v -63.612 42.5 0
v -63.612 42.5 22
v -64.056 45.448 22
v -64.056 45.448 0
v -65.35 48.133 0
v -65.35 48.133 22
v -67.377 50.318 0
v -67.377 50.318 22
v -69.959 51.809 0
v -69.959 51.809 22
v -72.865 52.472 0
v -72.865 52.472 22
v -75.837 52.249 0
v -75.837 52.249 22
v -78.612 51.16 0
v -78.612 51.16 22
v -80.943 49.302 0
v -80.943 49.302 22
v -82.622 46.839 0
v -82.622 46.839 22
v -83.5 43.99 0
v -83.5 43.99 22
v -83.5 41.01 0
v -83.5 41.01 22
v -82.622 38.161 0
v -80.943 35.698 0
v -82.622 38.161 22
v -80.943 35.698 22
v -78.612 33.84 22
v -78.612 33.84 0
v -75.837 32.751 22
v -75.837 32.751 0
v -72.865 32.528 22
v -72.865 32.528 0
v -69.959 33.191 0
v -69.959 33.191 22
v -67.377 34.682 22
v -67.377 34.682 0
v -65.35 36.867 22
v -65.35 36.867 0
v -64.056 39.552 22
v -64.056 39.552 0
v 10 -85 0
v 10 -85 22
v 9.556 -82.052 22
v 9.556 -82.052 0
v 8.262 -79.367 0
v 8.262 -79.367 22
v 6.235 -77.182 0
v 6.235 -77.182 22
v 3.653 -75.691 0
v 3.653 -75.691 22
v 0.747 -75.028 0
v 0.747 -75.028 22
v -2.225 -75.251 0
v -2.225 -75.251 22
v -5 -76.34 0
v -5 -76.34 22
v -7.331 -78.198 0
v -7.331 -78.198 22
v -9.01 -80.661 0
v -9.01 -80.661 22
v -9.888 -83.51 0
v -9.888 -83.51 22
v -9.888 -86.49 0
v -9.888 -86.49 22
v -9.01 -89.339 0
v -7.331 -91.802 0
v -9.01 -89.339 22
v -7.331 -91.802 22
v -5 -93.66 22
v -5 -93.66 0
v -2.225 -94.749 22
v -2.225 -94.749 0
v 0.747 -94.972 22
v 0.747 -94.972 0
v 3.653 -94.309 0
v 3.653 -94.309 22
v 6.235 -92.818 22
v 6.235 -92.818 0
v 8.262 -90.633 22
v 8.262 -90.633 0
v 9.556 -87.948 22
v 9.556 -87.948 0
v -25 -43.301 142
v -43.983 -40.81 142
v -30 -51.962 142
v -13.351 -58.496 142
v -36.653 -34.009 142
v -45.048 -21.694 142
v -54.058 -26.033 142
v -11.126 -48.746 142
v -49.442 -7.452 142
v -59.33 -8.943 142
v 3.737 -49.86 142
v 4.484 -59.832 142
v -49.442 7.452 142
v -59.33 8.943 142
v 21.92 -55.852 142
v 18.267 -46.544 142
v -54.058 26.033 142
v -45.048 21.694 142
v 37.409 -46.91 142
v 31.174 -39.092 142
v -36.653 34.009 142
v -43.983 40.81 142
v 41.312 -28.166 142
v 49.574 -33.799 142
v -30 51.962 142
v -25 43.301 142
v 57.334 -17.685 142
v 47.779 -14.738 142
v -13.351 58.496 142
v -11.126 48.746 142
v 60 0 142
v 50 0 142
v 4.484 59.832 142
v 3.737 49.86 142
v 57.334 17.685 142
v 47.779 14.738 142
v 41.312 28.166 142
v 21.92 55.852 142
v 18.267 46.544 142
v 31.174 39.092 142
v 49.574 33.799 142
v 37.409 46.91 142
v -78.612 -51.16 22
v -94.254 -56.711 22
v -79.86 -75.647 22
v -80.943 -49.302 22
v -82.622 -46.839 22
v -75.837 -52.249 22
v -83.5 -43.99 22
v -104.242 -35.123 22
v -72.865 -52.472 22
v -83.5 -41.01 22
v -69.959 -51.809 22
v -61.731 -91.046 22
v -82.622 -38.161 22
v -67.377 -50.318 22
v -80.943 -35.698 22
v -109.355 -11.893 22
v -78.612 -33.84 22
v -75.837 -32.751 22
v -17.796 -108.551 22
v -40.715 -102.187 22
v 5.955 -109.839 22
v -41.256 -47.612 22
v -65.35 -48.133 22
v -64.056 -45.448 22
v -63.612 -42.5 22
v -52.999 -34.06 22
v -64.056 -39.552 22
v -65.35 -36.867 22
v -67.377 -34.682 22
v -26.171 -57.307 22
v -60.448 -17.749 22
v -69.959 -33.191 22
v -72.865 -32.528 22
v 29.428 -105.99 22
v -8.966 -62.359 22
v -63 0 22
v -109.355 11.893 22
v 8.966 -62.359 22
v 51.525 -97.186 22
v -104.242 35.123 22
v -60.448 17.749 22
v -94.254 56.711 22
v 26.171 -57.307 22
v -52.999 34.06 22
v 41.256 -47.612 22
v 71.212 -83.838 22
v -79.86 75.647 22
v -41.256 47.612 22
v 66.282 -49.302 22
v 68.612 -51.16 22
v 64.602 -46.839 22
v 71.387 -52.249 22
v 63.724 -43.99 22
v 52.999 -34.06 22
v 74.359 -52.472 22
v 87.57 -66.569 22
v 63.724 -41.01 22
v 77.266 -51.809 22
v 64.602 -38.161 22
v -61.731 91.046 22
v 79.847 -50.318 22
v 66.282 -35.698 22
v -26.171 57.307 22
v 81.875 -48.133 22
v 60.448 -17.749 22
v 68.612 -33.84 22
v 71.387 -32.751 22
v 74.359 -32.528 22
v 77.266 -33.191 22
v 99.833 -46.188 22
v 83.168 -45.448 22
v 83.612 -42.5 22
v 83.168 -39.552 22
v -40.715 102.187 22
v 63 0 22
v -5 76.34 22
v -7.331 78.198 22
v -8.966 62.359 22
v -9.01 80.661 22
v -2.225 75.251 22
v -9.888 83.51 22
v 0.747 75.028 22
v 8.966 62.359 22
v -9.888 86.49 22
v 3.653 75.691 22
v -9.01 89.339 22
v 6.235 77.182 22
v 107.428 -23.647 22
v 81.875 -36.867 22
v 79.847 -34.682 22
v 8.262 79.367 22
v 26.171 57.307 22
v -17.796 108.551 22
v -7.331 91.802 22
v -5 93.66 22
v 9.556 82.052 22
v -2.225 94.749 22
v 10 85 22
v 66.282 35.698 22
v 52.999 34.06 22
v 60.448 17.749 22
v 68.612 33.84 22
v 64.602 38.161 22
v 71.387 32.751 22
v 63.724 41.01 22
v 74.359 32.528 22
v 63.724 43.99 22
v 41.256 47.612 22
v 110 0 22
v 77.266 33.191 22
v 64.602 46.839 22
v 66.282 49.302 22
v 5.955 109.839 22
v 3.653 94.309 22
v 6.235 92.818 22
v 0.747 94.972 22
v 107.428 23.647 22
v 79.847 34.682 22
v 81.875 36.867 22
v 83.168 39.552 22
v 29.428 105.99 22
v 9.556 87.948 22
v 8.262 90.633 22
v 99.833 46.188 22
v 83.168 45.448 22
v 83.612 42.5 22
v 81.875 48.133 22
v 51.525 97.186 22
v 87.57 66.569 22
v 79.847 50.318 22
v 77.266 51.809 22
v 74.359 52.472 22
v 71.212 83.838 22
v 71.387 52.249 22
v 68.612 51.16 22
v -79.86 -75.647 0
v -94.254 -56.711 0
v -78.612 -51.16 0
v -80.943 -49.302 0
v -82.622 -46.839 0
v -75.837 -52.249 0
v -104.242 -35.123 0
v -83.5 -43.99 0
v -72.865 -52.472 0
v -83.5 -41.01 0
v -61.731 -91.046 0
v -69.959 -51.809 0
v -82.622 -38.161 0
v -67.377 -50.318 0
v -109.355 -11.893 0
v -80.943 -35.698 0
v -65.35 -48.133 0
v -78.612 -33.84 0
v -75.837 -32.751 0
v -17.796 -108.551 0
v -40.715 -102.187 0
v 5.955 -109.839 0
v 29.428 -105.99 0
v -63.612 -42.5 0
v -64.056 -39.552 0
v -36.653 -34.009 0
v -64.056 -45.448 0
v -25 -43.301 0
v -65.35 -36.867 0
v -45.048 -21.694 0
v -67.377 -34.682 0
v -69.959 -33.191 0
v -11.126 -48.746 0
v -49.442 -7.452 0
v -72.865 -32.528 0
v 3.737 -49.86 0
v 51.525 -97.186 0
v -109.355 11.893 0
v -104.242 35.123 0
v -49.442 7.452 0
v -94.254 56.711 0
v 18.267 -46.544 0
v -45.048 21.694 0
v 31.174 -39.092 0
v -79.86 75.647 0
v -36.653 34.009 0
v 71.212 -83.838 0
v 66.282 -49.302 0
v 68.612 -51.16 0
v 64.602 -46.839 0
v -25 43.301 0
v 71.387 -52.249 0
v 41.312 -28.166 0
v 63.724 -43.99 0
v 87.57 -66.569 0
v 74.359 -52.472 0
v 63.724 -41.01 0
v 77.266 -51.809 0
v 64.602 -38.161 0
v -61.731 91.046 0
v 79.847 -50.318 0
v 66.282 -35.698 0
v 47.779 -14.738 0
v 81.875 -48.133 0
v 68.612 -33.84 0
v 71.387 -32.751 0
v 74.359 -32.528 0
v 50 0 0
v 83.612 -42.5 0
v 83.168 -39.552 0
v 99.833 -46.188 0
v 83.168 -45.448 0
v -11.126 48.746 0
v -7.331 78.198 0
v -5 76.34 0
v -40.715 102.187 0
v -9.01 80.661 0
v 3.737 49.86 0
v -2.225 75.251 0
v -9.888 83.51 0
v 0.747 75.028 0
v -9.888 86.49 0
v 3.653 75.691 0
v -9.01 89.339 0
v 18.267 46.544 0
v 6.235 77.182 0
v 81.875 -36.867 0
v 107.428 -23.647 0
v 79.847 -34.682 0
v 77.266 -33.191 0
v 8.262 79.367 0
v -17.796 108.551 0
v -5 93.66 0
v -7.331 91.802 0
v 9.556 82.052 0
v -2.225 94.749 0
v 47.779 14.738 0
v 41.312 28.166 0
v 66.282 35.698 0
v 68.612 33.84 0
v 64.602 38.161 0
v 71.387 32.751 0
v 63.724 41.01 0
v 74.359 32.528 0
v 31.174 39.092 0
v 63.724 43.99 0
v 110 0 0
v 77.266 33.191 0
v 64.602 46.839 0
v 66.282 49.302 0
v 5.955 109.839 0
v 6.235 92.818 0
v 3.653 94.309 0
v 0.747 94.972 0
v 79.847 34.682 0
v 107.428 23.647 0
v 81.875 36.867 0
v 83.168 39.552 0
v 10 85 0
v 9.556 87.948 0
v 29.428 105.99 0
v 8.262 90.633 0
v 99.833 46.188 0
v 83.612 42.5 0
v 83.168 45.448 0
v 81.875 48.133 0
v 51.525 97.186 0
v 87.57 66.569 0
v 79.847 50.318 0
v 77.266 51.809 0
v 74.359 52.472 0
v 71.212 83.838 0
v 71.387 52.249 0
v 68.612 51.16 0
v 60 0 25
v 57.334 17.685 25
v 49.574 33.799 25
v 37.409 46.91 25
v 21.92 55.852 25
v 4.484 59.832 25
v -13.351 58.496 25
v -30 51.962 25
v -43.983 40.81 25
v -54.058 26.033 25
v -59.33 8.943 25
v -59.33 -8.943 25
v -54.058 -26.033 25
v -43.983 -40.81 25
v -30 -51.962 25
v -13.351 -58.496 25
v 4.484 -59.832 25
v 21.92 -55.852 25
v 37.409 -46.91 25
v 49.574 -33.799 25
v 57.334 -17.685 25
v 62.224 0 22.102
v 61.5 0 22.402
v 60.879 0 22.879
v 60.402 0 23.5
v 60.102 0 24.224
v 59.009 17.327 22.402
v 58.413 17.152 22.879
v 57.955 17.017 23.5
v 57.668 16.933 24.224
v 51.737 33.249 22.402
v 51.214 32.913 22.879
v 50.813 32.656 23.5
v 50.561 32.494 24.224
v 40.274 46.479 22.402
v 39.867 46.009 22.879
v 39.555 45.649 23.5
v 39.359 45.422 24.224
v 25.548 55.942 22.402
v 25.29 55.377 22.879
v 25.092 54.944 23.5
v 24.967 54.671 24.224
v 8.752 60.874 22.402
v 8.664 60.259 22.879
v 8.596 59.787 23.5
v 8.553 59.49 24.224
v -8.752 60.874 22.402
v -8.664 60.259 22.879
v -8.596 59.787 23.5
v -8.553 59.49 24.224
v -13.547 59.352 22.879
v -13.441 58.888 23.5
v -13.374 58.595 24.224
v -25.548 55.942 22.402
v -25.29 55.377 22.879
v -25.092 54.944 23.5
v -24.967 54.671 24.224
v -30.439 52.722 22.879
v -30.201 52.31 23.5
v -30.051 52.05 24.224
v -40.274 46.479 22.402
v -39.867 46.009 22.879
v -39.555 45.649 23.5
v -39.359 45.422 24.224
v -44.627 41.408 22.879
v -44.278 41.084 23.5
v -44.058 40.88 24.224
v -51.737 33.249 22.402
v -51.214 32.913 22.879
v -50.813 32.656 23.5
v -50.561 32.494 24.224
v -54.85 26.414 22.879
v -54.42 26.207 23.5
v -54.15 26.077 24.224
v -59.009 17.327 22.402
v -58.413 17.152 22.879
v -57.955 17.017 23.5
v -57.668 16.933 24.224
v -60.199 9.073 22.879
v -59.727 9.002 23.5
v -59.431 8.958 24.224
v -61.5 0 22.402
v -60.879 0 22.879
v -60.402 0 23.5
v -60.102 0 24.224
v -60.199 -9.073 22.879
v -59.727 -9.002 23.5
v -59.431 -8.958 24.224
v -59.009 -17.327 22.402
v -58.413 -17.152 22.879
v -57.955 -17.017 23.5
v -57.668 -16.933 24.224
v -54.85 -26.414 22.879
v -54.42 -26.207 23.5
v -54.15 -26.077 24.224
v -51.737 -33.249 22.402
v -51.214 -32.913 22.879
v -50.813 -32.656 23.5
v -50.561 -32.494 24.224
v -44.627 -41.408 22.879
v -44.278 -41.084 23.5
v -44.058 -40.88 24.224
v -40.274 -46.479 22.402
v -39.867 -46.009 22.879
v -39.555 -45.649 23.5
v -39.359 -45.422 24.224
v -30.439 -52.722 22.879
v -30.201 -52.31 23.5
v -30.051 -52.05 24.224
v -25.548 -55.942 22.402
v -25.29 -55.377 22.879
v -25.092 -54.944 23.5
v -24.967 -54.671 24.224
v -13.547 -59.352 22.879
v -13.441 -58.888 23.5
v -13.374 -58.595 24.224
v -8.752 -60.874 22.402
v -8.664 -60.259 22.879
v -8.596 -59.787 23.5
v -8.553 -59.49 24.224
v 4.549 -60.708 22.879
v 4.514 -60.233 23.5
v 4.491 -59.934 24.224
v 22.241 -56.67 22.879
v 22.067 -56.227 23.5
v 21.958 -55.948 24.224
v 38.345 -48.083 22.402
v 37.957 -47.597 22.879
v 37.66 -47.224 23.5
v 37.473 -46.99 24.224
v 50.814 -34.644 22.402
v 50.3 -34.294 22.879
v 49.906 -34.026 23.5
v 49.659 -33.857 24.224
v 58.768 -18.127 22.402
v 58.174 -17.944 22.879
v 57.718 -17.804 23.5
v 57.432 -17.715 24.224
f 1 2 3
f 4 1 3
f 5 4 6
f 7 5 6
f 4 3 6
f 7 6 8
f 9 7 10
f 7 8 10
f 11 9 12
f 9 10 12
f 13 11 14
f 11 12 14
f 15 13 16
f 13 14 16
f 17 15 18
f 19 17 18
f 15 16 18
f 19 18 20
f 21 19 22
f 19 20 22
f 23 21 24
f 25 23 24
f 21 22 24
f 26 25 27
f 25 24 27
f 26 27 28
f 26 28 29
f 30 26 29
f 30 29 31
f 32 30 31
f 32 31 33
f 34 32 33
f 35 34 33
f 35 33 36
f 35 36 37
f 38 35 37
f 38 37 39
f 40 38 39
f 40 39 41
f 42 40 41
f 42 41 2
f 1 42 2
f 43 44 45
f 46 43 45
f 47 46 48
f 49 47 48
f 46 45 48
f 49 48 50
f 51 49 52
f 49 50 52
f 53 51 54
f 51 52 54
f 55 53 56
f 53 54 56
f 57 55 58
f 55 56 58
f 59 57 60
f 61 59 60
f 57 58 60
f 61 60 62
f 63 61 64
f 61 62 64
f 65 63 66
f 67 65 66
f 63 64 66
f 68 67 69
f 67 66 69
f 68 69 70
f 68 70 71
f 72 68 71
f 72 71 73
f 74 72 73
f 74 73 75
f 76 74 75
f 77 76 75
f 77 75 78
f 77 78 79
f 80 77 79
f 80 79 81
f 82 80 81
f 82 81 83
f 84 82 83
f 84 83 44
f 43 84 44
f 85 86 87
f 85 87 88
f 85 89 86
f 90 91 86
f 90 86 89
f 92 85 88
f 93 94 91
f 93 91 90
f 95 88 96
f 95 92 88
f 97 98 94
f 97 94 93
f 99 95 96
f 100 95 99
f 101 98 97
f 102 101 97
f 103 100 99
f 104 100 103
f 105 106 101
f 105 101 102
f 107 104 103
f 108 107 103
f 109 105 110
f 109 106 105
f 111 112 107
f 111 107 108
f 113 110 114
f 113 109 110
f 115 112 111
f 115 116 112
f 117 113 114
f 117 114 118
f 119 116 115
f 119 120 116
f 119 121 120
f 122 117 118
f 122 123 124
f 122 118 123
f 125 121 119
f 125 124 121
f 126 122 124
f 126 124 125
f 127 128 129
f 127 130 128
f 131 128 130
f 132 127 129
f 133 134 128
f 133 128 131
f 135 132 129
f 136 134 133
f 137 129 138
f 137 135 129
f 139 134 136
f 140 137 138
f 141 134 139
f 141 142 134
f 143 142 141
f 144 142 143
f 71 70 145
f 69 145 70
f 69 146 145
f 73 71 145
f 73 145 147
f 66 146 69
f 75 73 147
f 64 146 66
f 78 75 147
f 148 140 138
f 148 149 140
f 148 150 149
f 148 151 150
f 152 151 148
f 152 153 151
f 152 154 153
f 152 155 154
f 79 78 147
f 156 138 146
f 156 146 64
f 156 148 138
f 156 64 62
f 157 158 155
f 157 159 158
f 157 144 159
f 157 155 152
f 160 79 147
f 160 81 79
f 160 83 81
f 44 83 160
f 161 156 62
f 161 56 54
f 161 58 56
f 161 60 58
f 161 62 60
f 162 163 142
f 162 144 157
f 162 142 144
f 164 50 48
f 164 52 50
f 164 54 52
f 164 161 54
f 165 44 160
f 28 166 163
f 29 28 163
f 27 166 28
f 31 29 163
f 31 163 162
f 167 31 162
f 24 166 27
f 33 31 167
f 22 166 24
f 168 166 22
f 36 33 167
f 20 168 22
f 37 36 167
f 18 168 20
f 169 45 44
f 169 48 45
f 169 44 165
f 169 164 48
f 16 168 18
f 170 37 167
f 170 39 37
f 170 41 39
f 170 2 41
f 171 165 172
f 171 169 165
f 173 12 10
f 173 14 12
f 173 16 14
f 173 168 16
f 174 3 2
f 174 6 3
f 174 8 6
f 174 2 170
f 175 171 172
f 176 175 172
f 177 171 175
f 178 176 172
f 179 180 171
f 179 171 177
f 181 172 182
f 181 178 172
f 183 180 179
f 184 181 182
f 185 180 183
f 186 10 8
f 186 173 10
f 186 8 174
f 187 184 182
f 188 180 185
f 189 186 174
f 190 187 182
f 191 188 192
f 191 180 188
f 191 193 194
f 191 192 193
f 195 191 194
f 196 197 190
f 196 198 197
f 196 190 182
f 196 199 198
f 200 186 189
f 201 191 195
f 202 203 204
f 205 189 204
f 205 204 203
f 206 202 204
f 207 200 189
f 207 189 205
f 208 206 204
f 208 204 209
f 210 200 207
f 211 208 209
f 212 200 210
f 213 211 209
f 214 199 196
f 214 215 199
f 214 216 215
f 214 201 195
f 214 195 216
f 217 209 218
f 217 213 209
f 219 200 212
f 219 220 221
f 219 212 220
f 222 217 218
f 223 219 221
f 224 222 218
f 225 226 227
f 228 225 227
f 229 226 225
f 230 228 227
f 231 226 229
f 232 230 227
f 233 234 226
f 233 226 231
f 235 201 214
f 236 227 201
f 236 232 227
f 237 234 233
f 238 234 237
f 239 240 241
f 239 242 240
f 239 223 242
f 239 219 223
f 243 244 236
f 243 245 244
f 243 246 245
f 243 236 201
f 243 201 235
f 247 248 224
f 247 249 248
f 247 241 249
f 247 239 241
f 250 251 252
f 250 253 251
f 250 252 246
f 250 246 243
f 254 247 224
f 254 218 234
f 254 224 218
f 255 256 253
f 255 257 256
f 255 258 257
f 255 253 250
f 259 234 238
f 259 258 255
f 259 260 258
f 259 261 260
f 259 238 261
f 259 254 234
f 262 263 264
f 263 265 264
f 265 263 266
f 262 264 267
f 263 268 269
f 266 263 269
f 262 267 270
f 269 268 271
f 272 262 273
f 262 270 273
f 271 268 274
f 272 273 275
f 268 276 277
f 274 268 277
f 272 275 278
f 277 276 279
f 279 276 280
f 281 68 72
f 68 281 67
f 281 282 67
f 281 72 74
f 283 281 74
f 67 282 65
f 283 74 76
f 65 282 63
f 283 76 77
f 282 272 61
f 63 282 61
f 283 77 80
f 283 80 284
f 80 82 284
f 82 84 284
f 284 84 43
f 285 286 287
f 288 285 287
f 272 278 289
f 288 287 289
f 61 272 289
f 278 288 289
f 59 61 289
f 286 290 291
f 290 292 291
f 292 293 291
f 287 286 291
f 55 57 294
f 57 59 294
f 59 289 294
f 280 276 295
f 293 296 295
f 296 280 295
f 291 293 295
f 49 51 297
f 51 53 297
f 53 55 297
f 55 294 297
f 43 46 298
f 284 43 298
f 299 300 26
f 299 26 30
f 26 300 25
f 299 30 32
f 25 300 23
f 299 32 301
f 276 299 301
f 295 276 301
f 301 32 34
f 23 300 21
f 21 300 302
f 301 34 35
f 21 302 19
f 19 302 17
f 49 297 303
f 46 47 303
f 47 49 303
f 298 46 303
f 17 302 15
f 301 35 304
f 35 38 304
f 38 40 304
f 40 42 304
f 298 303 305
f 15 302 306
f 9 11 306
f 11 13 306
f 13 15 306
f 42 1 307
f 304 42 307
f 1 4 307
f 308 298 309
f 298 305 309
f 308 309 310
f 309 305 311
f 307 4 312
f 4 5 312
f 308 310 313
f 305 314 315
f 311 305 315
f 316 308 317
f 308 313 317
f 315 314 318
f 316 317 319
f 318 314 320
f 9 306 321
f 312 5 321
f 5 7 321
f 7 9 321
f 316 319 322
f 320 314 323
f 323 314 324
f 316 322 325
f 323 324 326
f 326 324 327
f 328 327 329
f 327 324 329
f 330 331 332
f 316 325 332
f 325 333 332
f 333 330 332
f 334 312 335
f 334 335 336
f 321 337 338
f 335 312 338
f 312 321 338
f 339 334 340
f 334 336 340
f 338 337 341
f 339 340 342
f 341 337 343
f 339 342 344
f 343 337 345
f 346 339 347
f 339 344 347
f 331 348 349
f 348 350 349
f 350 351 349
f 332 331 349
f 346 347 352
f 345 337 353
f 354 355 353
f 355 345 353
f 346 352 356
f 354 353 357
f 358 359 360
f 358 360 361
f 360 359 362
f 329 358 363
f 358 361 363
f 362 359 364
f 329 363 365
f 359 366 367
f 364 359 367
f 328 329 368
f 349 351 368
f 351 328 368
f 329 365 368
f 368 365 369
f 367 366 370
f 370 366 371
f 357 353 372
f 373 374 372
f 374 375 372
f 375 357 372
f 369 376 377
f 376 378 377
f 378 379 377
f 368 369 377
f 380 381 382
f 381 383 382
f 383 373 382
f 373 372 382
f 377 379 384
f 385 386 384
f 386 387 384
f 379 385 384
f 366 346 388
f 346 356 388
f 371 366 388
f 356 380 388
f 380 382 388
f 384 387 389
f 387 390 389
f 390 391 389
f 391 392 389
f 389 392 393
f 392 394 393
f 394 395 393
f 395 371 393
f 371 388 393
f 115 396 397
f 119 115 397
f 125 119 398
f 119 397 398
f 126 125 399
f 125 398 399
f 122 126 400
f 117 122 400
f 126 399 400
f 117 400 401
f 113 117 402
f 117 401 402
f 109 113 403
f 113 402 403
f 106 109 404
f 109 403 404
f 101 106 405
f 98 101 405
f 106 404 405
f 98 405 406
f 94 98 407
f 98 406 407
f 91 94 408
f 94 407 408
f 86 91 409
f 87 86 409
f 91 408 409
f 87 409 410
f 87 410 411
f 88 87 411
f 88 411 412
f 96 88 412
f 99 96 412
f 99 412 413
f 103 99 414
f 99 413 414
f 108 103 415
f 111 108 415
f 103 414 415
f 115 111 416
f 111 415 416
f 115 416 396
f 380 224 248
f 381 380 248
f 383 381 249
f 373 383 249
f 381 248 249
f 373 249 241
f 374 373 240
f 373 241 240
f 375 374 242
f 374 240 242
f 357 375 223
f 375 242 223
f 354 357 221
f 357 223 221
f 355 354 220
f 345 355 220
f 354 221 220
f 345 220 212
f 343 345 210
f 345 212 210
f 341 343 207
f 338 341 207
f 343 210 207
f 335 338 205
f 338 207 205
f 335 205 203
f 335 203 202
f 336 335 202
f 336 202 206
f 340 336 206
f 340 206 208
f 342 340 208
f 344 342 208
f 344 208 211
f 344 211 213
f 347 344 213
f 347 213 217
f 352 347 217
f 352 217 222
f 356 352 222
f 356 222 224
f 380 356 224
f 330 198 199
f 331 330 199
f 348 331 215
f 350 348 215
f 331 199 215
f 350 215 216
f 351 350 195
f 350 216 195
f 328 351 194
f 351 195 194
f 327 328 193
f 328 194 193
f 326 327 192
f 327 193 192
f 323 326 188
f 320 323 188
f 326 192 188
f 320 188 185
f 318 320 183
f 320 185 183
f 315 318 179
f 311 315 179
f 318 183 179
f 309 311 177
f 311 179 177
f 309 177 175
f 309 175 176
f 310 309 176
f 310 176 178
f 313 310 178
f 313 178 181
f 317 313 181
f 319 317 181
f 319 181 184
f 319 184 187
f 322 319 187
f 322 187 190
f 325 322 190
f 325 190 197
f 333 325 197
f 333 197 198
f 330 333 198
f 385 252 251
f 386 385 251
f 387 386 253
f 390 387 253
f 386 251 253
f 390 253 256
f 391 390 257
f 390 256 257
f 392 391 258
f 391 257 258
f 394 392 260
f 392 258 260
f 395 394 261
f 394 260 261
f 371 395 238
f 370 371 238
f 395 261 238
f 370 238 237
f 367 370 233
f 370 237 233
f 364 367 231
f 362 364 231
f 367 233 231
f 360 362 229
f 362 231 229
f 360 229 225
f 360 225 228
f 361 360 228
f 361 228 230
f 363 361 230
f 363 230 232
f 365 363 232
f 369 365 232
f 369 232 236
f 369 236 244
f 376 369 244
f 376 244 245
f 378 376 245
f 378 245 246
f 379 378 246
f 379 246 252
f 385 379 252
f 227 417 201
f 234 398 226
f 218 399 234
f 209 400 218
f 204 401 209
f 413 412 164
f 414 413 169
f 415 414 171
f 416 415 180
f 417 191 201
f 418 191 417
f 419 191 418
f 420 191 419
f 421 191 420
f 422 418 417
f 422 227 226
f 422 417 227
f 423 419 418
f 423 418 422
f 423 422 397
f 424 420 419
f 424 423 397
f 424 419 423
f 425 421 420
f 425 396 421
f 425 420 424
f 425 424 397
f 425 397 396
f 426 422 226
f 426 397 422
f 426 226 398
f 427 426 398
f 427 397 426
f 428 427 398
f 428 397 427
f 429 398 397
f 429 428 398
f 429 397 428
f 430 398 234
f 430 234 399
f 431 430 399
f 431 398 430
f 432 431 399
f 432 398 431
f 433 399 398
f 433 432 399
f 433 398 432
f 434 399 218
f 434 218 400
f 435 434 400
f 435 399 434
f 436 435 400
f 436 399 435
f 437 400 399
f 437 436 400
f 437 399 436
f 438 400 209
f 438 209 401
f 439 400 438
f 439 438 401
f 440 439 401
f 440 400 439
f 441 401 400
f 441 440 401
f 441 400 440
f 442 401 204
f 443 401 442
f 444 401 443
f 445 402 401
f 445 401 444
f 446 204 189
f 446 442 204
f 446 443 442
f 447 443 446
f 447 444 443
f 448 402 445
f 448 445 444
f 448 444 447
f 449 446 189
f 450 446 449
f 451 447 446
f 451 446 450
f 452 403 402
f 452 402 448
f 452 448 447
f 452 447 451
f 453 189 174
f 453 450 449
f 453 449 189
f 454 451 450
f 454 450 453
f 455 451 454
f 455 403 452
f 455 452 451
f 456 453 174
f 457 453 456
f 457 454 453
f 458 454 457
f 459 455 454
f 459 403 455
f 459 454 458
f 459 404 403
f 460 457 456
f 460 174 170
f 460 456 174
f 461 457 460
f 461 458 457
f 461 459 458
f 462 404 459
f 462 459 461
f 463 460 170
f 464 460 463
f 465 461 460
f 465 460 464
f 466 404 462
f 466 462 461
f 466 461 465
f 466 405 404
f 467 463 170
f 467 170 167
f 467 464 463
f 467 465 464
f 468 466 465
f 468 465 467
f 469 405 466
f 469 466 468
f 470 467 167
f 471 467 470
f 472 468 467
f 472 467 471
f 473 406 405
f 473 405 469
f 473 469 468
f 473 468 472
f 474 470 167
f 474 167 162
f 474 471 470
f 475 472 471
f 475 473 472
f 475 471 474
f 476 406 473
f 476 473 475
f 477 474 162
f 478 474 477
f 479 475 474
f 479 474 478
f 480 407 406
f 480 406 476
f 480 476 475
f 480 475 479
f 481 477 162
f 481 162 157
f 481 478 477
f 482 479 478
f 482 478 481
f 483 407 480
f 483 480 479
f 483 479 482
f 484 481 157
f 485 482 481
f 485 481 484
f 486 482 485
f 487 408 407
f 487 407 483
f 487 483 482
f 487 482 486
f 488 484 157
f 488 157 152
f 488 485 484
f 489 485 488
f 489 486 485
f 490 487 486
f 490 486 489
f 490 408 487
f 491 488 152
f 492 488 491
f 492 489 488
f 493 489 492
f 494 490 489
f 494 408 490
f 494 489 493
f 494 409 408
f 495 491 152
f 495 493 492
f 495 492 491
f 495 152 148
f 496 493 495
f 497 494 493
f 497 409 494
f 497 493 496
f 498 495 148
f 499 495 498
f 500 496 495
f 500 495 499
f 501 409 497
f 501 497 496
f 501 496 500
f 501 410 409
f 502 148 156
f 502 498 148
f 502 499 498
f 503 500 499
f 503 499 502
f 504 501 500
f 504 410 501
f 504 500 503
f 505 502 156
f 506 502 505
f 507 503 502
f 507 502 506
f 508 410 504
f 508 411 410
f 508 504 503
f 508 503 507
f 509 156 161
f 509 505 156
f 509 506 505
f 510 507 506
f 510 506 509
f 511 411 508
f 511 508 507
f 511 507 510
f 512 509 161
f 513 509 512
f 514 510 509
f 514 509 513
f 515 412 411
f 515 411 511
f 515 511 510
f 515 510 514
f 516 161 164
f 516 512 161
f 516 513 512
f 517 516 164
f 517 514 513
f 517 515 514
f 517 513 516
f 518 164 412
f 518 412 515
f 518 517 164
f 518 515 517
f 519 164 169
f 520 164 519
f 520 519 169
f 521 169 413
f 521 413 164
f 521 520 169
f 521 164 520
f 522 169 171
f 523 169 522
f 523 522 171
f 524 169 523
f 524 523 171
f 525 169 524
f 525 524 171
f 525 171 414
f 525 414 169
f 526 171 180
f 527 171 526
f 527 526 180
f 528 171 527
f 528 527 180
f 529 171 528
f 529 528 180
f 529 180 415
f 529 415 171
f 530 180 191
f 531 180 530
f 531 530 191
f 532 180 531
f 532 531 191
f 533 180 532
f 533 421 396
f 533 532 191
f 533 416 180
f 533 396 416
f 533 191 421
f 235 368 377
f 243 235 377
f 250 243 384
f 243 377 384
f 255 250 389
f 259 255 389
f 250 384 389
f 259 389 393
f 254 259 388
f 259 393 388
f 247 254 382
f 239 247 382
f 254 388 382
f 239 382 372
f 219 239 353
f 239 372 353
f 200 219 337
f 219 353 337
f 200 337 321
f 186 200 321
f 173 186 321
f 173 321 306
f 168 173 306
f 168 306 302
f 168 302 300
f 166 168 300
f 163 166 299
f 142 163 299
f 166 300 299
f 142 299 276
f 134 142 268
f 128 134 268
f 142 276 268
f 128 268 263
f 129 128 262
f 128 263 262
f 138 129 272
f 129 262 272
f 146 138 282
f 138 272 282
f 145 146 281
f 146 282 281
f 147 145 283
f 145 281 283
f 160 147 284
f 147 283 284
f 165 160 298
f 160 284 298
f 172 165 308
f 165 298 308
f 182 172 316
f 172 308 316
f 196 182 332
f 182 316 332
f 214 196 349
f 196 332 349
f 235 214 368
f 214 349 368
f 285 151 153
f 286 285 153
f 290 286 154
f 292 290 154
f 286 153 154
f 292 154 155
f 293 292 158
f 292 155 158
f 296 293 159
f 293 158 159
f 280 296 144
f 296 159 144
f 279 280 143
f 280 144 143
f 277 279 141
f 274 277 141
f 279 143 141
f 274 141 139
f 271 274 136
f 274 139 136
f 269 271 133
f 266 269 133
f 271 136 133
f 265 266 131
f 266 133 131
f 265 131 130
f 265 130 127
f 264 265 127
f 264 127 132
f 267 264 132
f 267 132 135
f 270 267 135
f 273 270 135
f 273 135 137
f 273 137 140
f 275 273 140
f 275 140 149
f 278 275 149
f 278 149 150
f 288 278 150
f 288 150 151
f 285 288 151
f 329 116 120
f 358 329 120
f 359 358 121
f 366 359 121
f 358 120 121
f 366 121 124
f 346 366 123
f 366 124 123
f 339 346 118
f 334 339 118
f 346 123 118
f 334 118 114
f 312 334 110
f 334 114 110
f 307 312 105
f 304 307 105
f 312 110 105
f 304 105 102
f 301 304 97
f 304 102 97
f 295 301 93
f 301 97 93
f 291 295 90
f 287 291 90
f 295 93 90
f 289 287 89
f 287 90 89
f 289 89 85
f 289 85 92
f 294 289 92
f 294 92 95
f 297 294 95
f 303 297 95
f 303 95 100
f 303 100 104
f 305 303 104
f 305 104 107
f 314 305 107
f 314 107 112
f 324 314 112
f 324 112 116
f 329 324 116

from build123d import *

# Parameters (mm, degrees)
SKETCH2_R           = 110
BOSS_EXTRUDE1_DEPTH = 22
SKETCH3_R           = 60
BOSS_EXTRUDE2_DEPTH = 120
SKETCH4_R           = 50
CUT_EXTRUDE1_DEPTH  = 143
SKETCH5_R           = 10
CUT_EXTRUDE2_DEPTH  = 23
FILLET1_R           = 3


with BuildPart() as part:
    # Sketch2 → Boss-Extrude1 (new body)
    with BuildSketch(Plane.XY):
        Circle(SKETCH2_R)
    extrude(amount=BOSS_EXTRUDE1_DEPTH)

    # Sketch3 → Boss-Extrude2 (add)
    with BuildSketch(Plane.XY.offset(22)):
        Circle(SKETCH3_R)
    extrude(amount=BOSS_EXTRUDE2_DEPTH)

    # Sketch4 → Cut-Extrude1 (cut, through all)
    with BuildSketch(Plane.XY.offset(142)):
        Circle(SKETCH4_R)
    extrude(amount=-CUT_EXTRUDE1_DEPTH, mode=Mode.SUBTRACT)

    # Sketch5 → Cut-Extrude2 (cut, through all)
    with BuildSketch(Plane.XY.offset(22)):
        with Locations((0, 85)):
            Circle(SKETCH5_R)
        with Locations((73.612159322, 42.5)):
            Circle(SKETCH5_R)
        with Locations((73.612159322, -42.5)):
            Circle(SKETCH5_R)
        with Locations((0, -85)):
            Circle(SKETCH5_R)
        with Locations((-73.612159322, -42.5)):
            Circle(SKETCH5_R)
        with Locations((-73.612159322, 42.5)):
            Circle(SKETCH5_R)
    extrude(amount=-CUT_EXTRUDE2_DEPTH, mode=Mode.SUBTRACT)

    # Fillet1
    fillet1_edges = [part.edges().sort_by_distance(p)[0] for p in [
        (-60, 0, 22),
    ]]
    fillet(fillet1_edges, radius=FILLET1_R)


solid = part.part
